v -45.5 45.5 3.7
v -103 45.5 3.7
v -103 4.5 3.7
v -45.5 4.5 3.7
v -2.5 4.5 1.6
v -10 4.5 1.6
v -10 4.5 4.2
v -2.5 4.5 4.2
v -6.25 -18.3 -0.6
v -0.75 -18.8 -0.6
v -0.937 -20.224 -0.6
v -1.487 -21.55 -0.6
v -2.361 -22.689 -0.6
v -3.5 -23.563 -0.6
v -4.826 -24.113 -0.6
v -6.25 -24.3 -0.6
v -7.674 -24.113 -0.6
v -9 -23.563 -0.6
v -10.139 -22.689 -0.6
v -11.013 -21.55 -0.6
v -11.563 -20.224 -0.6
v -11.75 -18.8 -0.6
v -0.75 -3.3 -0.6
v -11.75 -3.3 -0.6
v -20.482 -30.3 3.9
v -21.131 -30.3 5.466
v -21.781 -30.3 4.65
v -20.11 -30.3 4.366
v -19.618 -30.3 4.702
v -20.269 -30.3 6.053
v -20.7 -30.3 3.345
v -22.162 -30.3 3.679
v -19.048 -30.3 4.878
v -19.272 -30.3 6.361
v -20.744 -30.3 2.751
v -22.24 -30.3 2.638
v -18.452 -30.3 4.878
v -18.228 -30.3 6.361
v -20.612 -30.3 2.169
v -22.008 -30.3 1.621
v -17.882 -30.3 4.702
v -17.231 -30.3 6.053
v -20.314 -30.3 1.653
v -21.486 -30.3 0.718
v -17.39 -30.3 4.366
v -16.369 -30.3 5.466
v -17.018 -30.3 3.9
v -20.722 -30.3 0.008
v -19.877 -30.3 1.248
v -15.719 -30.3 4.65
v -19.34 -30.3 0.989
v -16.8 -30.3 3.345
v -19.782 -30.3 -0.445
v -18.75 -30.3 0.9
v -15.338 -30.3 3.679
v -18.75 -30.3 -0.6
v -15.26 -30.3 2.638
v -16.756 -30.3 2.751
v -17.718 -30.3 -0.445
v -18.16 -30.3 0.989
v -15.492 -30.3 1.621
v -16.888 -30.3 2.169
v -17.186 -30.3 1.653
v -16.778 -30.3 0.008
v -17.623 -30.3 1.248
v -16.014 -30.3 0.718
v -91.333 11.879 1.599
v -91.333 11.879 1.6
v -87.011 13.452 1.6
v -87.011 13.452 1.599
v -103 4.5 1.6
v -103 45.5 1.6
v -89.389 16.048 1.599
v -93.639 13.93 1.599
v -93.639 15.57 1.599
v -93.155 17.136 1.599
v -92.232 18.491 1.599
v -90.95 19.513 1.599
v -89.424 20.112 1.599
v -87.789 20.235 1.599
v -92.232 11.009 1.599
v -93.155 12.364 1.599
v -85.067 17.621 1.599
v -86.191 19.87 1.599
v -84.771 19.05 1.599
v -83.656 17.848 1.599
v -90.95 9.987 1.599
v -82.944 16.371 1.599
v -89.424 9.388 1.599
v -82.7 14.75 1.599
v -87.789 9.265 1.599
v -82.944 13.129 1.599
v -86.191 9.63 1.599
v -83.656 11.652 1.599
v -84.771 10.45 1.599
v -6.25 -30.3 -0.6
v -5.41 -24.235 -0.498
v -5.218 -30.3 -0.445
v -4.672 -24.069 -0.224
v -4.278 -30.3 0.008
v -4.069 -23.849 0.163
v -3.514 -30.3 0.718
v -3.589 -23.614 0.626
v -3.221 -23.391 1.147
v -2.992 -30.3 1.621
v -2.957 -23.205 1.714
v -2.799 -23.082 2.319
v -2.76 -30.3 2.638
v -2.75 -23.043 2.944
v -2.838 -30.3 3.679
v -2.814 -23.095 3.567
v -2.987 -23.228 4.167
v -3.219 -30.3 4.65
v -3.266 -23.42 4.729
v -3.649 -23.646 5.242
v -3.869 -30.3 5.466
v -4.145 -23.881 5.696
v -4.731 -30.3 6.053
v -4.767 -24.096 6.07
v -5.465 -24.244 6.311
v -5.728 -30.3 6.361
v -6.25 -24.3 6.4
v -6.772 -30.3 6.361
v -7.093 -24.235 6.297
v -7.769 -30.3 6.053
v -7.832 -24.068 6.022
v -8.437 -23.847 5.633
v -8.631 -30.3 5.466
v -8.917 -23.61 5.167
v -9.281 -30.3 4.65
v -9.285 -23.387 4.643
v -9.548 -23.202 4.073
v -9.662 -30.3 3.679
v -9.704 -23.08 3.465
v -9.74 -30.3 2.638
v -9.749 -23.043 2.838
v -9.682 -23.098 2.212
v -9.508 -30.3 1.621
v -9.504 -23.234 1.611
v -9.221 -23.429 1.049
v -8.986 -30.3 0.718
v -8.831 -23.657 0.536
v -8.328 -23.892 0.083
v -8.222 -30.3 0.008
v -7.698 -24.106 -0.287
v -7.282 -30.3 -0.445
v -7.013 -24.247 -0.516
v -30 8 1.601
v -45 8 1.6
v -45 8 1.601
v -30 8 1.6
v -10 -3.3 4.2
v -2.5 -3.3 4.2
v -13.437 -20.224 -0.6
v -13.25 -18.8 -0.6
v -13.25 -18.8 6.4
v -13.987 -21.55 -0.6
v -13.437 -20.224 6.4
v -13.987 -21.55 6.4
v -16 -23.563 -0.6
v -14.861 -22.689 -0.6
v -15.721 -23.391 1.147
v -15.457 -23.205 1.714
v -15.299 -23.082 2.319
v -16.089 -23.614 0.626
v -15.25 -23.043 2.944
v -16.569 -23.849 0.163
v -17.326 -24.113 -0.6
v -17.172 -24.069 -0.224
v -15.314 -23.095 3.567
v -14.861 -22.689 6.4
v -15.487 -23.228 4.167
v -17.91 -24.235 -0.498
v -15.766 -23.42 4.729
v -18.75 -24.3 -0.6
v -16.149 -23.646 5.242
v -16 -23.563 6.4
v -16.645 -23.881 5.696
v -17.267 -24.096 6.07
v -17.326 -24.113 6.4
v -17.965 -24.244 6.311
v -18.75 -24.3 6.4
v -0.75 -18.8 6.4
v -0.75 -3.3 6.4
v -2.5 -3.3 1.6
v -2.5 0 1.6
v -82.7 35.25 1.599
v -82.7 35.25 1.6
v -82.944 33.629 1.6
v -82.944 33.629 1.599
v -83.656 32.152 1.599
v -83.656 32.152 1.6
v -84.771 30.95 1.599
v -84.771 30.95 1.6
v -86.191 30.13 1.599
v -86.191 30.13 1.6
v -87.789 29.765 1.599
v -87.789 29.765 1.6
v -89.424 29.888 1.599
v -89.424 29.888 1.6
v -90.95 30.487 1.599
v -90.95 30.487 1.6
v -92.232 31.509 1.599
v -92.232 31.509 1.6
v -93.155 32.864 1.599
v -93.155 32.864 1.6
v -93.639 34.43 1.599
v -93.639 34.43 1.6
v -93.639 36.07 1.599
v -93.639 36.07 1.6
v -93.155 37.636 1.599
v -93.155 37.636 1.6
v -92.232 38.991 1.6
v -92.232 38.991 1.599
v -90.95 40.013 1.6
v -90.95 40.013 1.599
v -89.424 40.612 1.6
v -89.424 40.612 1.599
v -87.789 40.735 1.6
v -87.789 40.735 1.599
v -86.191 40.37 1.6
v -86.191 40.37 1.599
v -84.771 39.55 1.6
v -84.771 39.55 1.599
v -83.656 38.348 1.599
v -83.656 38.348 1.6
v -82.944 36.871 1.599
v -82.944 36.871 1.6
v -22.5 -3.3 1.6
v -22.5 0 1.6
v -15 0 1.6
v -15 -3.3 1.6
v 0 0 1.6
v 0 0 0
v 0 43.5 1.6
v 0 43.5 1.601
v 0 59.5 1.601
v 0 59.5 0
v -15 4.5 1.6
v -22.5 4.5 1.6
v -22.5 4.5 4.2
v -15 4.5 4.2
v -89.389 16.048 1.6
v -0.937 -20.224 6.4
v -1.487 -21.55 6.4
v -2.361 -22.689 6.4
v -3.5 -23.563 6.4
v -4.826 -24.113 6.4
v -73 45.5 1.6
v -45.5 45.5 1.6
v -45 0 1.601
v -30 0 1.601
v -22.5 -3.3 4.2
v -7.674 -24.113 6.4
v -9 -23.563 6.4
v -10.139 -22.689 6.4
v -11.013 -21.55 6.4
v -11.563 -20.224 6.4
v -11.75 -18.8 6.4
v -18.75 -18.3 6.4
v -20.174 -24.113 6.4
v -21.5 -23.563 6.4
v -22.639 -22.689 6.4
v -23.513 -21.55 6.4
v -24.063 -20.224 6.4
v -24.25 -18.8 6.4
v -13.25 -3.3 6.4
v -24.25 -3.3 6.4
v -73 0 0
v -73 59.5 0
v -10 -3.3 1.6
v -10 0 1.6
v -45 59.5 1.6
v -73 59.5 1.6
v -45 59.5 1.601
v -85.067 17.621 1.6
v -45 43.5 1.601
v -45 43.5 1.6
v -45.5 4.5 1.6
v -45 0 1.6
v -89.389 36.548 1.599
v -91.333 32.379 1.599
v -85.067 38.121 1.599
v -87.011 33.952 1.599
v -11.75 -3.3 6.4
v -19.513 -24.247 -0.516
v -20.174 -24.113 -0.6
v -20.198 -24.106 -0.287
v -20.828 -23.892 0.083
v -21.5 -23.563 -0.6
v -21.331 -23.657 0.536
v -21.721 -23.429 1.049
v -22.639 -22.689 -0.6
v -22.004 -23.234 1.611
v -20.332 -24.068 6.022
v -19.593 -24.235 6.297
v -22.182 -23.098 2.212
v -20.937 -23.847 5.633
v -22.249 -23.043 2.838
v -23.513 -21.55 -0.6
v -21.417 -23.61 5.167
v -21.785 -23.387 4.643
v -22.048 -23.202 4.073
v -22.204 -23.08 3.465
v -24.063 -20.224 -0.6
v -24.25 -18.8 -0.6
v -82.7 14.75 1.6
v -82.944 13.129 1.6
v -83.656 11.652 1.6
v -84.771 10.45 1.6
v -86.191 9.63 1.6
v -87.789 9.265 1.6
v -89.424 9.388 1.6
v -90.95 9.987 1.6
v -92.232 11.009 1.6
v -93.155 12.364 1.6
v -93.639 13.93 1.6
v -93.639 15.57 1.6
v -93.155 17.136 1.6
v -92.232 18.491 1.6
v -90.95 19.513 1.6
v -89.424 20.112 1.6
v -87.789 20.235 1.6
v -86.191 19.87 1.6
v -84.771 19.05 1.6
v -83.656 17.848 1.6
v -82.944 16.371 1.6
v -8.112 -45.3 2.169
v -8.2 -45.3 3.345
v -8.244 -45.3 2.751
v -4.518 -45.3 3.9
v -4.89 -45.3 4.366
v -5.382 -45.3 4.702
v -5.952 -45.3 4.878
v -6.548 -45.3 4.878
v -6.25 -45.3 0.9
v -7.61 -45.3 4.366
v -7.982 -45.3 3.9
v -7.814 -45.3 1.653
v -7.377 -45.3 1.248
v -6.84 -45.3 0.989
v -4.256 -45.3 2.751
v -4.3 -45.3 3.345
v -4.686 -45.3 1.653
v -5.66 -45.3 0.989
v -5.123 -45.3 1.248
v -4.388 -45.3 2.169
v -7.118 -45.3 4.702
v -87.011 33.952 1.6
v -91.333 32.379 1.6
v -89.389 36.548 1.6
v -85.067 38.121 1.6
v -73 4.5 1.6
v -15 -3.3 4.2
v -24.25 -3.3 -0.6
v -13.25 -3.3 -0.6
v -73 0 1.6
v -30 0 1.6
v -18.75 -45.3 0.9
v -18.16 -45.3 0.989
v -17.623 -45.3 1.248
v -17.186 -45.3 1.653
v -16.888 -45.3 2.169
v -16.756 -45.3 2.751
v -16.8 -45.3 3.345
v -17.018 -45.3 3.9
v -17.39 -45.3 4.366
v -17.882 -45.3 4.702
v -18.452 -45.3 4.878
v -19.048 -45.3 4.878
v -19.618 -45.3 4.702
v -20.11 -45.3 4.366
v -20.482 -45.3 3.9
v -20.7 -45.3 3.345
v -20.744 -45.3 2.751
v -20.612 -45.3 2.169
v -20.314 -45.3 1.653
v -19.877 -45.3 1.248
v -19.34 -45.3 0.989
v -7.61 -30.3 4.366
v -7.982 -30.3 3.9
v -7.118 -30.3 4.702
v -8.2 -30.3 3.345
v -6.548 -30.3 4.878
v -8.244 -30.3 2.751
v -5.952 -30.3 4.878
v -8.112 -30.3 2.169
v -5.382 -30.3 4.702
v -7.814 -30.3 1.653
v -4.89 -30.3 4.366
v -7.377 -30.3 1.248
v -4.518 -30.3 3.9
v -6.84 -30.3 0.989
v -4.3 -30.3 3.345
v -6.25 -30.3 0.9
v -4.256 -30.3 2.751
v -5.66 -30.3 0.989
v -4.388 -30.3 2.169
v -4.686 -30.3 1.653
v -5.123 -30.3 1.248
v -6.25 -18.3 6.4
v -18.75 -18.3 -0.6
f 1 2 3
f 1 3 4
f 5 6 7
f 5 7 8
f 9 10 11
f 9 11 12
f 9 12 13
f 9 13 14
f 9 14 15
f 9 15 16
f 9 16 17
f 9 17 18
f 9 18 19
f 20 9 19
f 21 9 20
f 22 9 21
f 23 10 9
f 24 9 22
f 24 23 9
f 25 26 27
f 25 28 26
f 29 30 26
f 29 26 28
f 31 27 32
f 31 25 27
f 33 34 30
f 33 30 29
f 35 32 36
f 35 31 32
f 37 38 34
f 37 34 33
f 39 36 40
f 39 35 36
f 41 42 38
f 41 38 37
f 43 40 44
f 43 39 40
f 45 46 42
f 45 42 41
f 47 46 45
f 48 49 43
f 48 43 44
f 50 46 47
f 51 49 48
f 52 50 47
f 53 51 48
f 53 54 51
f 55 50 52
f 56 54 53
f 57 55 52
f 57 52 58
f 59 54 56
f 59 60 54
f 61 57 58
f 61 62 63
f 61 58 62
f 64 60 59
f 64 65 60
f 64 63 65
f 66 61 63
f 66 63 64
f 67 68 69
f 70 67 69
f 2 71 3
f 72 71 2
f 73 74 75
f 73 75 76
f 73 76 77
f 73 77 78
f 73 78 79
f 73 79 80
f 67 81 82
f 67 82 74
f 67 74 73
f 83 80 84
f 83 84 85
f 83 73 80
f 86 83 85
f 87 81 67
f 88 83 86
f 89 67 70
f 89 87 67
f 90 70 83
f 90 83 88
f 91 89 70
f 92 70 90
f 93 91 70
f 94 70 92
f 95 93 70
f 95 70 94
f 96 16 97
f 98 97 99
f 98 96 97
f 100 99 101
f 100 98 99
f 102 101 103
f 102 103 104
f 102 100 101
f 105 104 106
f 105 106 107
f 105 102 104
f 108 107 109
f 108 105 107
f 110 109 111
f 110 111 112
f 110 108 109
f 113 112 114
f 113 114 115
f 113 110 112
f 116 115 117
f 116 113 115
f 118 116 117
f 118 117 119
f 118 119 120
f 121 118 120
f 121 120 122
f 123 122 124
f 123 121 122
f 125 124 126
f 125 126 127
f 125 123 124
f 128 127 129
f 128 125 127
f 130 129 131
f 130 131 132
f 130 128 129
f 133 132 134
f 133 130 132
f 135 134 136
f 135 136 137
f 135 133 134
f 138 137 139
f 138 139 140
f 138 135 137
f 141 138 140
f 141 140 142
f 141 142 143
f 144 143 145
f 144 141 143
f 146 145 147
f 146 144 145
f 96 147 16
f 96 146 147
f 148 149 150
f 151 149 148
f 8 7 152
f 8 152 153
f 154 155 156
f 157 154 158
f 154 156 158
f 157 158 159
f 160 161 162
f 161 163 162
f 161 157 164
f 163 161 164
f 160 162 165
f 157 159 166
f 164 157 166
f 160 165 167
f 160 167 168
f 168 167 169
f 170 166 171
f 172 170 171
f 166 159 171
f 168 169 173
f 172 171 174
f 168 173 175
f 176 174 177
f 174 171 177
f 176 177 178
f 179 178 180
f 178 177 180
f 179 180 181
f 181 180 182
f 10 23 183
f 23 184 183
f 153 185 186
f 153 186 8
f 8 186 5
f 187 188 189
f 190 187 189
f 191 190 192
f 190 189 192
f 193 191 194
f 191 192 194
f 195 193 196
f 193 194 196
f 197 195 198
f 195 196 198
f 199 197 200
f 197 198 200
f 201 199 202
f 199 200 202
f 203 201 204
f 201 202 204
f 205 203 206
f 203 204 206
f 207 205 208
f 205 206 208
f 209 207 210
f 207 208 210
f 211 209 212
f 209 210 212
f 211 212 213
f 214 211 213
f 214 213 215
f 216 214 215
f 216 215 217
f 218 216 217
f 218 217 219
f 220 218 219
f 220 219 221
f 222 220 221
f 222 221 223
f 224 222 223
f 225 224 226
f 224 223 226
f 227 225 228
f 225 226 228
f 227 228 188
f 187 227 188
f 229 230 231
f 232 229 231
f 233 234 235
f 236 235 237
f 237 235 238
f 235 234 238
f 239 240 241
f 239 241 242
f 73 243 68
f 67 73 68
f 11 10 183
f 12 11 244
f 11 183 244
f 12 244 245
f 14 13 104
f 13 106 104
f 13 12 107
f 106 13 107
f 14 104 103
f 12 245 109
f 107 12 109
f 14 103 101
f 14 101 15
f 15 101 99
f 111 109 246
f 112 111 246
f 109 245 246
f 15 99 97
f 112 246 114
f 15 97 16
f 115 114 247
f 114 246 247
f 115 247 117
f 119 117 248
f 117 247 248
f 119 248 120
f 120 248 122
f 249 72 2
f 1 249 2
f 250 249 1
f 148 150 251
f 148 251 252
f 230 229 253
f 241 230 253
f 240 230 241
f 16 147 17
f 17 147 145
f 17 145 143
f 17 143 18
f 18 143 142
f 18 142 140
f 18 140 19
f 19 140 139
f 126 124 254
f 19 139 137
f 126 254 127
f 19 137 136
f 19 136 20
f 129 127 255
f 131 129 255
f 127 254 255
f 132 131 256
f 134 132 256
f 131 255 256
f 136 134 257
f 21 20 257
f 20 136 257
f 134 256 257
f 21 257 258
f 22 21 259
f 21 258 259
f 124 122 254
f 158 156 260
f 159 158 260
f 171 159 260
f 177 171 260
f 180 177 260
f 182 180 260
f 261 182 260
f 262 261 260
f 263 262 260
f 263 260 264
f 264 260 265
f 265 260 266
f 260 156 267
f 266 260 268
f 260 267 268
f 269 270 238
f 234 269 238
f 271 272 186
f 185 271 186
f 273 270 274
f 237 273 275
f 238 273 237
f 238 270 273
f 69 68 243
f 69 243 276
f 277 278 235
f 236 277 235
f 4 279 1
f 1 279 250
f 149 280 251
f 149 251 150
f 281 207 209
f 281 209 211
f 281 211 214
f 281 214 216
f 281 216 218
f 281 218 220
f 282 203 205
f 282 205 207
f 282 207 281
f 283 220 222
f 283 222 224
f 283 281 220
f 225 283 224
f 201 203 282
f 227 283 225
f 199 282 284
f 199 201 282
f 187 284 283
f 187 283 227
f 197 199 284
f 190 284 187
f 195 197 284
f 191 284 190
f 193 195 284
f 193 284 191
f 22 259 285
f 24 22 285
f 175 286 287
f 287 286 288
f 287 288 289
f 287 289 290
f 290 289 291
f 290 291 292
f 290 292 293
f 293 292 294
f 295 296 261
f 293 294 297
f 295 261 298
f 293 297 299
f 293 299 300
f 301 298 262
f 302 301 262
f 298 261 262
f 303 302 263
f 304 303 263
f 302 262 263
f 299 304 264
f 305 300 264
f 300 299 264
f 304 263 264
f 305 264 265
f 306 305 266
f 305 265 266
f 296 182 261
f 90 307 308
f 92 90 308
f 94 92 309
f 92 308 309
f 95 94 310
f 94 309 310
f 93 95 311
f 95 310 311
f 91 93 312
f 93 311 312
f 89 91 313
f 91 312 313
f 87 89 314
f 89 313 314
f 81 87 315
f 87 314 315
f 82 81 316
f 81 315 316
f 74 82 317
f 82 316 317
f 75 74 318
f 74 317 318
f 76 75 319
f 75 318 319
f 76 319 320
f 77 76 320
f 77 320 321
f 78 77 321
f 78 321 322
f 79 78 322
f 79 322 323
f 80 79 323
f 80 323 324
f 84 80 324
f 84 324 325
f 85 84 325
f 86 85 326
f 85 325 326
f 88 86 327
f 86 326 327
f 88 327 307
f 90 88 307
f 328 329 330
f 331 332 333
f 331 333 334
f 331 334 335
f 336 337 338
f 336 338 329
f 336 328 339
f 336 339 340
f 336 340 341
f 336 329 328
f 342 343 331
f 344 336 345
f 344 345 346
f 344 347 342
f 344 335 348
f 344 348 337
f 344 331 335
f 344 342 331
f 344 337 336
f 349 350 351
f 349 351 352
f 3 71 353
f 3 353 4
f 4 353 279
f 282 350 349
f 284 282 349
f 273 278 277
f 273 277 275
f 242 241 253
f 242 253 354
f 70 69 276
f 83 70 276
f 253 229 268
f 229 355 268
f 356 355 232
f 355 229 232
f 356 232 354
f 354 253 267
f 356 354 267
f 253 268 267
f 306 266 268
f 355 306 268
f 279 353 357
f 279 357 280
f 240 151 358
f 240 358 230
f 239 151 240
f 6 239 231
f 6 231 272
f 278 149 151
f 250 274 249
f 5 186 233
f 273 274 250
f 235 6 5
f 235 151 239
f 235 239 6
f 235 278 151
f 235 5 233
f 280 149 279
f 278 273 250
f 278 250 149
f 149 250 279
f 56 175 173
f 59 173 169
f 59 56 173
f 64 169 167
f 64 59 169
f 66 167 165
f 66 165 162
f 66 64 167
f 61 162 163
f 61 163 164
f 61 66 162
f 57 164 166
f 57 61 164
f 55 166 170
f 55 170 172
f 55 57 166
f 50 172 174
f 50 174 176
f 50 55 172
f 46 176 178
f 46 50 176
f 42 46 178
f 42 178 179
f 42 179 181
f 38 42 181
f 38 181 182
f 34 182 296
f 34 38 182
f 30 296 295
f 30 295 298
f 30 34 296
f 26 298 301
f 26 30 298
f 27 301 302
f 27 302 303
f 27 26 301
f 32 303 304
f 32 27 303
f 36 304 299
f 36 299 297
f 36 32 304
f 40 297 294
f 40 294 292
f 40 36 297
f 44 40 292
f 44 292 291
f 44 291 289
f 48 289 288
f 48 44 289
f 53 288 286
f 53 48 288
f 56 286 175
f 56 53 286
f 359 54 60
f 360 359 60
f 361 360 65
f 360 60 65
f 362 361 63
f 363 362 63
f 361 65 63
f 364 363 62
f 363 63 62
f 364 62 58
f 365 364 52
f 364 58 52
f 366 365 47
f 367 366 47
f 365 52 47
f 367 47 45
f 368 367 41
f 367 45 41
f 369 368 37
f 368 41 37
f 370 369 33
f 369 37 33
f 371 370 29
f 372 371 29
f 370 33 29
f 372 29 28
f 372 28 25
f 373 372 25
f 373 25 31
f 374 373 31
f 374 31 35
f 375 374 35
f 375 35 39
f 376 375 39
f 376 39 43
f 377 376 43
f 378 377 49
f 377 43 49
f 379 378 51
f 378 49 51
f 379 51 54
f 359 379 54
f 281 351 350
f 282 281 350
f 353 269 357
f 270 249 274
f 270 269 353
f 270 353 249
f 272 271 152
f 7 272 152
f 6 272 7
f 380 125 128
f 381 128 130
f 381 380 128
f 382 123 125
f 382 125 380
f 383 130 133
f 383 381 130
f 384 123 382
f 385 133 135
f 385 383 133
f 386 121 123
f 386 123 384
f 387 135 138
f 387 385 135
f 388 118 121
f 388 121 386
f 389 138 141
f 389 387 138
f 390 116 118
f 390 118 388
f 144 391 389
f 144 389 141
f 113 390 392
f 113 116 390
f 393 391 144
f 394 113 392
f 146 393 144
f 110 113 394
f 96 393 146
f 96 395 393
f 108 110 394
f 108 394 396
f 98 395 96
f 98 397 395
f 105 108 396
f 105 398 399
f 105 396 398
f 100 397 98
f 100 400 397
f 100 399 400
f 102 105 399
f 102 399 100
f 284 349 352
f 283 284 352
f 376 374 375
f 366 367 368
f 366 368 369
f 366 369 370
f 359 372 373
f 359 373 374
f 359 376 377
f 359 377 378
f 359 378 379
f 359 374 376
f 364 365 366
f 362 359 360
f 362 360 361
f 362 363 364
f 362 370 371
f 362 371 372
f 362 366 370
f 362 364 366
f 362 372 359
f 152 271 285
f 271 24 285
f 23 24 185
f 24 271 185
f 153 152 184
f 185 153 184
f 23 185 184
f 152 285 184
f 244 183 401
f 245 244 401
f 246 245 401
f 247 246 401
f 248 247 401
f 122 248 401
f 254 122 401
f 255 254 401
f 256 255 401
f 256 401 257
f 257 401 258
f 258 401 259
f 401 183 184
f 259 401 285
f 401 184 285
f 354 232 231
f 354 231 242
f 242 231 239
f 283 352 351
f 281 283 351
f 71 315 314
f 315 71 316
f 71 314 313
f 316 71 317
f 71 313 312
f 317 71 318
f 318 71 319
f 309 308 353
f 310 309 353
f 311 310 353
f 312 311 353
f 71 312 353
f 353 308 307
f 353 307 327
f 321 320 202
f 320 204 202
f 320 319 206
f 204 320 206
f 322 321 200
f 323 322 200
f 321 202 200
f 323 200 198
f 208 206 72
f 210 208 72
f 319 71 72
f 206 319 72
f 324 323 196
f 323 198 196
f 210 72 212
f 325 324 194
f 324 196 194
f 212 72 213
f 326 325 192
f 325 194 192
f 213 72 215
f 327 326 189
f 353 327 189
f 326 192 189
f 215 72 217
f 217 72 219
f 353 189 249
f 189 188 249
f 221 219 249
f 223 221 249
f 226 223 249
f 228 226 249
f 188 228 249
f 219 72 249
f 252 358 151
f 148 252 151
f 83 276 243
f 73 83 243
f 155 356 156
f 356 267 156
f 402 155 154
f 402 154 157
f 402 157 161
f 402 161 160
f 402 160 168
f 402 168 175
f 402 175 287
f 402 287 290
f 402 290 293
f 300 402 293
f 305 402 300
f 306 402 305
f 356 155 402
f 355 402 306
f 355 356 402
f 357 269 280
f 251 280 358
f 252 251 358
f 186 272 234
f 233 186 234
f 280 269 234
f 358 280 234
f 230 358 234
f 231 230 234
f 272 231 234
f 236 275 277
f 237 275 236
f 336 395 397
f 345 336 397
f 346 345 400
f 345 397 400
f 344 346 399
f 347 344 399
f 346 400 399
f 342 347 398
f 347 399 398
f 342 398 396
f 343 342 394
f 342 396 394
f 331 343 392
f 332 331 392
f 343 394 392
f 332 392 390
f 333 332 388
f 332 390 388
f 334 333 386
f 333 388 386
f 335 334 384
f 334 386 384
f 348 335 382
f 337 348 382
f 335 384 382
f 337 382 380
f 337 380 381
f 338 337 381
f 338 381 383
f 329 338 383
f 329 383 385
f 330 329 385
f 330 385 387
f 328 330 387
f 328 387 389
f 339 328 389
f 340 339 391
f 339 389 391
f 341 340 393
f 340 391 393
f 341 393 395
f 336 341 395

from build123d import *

# Parameters (mm, degrees)
SKETCH1_W                = 73
SKETCH1_H                = 59.5
GREEN_PCB_DEPTH          = 1.6
SKETCH2_W                = 57.5
SKETCH2_H                = 41
BLUE_PCB_DEPTH           = 2.1
SKETCH3_W                = 45
SKETCH3_H                = 16
SKETCH3_W_2              = 15
SKETCH3_H_2              = 8
CLAMP_AREA_DEPTH         = 0.001
SKETCH4_W                = 7.5
SKETCH4_H                = 7.8
USB_PORT_DEPTH           = 2.6
USB_BODY_DEPTH           = 3.5
SKETCH7_R                = 3.5
USB_TENSION_RELIEF_DEPTH = 6
SKETCH8_R                = 2
USB_CORD_DEPTH           = 15
SKETCH9_R                = 5.5
MONA_LISA_ANTENNA_DEPTH  = 0.001
LPATTERN1_COUNT          = 2
LPATTERN1_PITCH          = 20.5
LPATTERN2_COUNT          = 2
LPATTERN2_PITCH          = 12.5


with BuildPart() as part:
    # Sketch1 → Green PCB (new body)
    with BuildSketch(Plane.XY):
        with Locations((-36.5, 29.75)):
            Rectangle(SKETCH1_W, SKETCH1_H)
    extrude(amount=GREEN_PCB_DEPTH)

    # Sketch2 → Blue PCB (add)
    with BuildSketch(Plane.XY.offset(1.6)):
        with Locations((-74.25, 25)):
            Rectangle(SKETCH2_W, SKETCH2_H)
    extrude(amount=BLUE_PCB_DEPTH)

    # Sketch3 → Clamp Area (add)
    with BuildSketch(Plane.XY.offset(1.6)):
        with Locations((-22.5, 51.5)):
            Rectangle(SKETCH3_W, SKETCH3_H)
        with Locations((-37.5, 4)):
            Rectangle(SKETCH3_W_2, SKETCH3_H_2)
    extrude(amount=CLAMP_AREA_DEPTH)

    # Sketch4 → USB Port (add)
    with BuildSketch(Plane.XY.offset(1.6)):
        with Locations((-6.25, 0.6)):
            Rectangle(SKETCH4_W, SKETCH4_H)
    usb_port = extrude(amount=USB_PORT_DEPTH)

    # Sketch5 → USB Body (add, symmetric)
    with BuildSketch(Plane.XY.offset(2.9)):
        with BuildLine():
            Line((-11.75, -3.3), (-0.75, -3.3))
            Line((-0.75, -3.3), (-0.75, -18.8))
            ThreePointArc((-0.75, -18.8), (-6.25, -24.3), (-11.75, -18.8))
            Line((-11.75, -18.8), (-11.75, -3.3))
        make_face()
    usb_body = extrude(amount=USB_BODY_DEPTH, both=True)

    # Sketch7 → USB Tension Relief (add, symmetric)
    with BuildSketch(Plane(origin=(0, -24.3, 0), x_dir=(-1, 0, 0), z_dir=(0, -1, 0))):
        with Locations(Location((6.25, -2.9, 0), (0, 0, 90))):
            Circle(SKETCH7_R)
    usb_tension_relief = extrude(amount=USB_TENSION_RELIEF_DEPTH, both=True)

    # Sketch8 → USB Cord (add)
    with BuildSketch(Plane.XZ.offset(30.3)):
        with Locations(Location((-6.25, 2.9, 0), (0, 0, 270))):
            Circle(SKETCH8_R)
    usb_cord = extrude(amount=USB_CORD_DEPTH)

    # Sketch9 → Mona Lisa Antenna (add)
    with BuildSketch(Plane(origin=(0, 0, 1.6), x_dir=(-1, 0, 0), z_dir=(0, 0, -1))):
        with Locations(Location((88.2, 35.25, 0), (0, 0, 180))):
            Circle(SKETCH9_R)
        Polygon((85.066571319, 38.121258382), (89.389314163, 36.547908657), (91.333428681, 32.378741618), (87.010685837, 33.952091343), align=None, mode=Mode.SUBTRACT)
    mona_lisa_antenna = extrude(amount=MONA_LISA_ANTENNA_DEPTH)

    # LPattern1: Mona Lisa Antenna ×2
    with Locations(*[(0, -i * LPATTERN1_PITCH, 0) for i in range(1, LPATTERN1_COUNT)]):
        add(mona_lisa_antenna)

    # LPattern2: USB Port, USB Body, USB Tension Relief, USB Cord ×2
    with Locations(*[(-i * LPATTERN2_PITCH, 0, 0) for i in range(1, LPATTERN2_COUNT)]):
        add(usb_port)
        add(usb_body)
        add(usb_tension_relief)
        add(usb_cord)


solid = part.part
